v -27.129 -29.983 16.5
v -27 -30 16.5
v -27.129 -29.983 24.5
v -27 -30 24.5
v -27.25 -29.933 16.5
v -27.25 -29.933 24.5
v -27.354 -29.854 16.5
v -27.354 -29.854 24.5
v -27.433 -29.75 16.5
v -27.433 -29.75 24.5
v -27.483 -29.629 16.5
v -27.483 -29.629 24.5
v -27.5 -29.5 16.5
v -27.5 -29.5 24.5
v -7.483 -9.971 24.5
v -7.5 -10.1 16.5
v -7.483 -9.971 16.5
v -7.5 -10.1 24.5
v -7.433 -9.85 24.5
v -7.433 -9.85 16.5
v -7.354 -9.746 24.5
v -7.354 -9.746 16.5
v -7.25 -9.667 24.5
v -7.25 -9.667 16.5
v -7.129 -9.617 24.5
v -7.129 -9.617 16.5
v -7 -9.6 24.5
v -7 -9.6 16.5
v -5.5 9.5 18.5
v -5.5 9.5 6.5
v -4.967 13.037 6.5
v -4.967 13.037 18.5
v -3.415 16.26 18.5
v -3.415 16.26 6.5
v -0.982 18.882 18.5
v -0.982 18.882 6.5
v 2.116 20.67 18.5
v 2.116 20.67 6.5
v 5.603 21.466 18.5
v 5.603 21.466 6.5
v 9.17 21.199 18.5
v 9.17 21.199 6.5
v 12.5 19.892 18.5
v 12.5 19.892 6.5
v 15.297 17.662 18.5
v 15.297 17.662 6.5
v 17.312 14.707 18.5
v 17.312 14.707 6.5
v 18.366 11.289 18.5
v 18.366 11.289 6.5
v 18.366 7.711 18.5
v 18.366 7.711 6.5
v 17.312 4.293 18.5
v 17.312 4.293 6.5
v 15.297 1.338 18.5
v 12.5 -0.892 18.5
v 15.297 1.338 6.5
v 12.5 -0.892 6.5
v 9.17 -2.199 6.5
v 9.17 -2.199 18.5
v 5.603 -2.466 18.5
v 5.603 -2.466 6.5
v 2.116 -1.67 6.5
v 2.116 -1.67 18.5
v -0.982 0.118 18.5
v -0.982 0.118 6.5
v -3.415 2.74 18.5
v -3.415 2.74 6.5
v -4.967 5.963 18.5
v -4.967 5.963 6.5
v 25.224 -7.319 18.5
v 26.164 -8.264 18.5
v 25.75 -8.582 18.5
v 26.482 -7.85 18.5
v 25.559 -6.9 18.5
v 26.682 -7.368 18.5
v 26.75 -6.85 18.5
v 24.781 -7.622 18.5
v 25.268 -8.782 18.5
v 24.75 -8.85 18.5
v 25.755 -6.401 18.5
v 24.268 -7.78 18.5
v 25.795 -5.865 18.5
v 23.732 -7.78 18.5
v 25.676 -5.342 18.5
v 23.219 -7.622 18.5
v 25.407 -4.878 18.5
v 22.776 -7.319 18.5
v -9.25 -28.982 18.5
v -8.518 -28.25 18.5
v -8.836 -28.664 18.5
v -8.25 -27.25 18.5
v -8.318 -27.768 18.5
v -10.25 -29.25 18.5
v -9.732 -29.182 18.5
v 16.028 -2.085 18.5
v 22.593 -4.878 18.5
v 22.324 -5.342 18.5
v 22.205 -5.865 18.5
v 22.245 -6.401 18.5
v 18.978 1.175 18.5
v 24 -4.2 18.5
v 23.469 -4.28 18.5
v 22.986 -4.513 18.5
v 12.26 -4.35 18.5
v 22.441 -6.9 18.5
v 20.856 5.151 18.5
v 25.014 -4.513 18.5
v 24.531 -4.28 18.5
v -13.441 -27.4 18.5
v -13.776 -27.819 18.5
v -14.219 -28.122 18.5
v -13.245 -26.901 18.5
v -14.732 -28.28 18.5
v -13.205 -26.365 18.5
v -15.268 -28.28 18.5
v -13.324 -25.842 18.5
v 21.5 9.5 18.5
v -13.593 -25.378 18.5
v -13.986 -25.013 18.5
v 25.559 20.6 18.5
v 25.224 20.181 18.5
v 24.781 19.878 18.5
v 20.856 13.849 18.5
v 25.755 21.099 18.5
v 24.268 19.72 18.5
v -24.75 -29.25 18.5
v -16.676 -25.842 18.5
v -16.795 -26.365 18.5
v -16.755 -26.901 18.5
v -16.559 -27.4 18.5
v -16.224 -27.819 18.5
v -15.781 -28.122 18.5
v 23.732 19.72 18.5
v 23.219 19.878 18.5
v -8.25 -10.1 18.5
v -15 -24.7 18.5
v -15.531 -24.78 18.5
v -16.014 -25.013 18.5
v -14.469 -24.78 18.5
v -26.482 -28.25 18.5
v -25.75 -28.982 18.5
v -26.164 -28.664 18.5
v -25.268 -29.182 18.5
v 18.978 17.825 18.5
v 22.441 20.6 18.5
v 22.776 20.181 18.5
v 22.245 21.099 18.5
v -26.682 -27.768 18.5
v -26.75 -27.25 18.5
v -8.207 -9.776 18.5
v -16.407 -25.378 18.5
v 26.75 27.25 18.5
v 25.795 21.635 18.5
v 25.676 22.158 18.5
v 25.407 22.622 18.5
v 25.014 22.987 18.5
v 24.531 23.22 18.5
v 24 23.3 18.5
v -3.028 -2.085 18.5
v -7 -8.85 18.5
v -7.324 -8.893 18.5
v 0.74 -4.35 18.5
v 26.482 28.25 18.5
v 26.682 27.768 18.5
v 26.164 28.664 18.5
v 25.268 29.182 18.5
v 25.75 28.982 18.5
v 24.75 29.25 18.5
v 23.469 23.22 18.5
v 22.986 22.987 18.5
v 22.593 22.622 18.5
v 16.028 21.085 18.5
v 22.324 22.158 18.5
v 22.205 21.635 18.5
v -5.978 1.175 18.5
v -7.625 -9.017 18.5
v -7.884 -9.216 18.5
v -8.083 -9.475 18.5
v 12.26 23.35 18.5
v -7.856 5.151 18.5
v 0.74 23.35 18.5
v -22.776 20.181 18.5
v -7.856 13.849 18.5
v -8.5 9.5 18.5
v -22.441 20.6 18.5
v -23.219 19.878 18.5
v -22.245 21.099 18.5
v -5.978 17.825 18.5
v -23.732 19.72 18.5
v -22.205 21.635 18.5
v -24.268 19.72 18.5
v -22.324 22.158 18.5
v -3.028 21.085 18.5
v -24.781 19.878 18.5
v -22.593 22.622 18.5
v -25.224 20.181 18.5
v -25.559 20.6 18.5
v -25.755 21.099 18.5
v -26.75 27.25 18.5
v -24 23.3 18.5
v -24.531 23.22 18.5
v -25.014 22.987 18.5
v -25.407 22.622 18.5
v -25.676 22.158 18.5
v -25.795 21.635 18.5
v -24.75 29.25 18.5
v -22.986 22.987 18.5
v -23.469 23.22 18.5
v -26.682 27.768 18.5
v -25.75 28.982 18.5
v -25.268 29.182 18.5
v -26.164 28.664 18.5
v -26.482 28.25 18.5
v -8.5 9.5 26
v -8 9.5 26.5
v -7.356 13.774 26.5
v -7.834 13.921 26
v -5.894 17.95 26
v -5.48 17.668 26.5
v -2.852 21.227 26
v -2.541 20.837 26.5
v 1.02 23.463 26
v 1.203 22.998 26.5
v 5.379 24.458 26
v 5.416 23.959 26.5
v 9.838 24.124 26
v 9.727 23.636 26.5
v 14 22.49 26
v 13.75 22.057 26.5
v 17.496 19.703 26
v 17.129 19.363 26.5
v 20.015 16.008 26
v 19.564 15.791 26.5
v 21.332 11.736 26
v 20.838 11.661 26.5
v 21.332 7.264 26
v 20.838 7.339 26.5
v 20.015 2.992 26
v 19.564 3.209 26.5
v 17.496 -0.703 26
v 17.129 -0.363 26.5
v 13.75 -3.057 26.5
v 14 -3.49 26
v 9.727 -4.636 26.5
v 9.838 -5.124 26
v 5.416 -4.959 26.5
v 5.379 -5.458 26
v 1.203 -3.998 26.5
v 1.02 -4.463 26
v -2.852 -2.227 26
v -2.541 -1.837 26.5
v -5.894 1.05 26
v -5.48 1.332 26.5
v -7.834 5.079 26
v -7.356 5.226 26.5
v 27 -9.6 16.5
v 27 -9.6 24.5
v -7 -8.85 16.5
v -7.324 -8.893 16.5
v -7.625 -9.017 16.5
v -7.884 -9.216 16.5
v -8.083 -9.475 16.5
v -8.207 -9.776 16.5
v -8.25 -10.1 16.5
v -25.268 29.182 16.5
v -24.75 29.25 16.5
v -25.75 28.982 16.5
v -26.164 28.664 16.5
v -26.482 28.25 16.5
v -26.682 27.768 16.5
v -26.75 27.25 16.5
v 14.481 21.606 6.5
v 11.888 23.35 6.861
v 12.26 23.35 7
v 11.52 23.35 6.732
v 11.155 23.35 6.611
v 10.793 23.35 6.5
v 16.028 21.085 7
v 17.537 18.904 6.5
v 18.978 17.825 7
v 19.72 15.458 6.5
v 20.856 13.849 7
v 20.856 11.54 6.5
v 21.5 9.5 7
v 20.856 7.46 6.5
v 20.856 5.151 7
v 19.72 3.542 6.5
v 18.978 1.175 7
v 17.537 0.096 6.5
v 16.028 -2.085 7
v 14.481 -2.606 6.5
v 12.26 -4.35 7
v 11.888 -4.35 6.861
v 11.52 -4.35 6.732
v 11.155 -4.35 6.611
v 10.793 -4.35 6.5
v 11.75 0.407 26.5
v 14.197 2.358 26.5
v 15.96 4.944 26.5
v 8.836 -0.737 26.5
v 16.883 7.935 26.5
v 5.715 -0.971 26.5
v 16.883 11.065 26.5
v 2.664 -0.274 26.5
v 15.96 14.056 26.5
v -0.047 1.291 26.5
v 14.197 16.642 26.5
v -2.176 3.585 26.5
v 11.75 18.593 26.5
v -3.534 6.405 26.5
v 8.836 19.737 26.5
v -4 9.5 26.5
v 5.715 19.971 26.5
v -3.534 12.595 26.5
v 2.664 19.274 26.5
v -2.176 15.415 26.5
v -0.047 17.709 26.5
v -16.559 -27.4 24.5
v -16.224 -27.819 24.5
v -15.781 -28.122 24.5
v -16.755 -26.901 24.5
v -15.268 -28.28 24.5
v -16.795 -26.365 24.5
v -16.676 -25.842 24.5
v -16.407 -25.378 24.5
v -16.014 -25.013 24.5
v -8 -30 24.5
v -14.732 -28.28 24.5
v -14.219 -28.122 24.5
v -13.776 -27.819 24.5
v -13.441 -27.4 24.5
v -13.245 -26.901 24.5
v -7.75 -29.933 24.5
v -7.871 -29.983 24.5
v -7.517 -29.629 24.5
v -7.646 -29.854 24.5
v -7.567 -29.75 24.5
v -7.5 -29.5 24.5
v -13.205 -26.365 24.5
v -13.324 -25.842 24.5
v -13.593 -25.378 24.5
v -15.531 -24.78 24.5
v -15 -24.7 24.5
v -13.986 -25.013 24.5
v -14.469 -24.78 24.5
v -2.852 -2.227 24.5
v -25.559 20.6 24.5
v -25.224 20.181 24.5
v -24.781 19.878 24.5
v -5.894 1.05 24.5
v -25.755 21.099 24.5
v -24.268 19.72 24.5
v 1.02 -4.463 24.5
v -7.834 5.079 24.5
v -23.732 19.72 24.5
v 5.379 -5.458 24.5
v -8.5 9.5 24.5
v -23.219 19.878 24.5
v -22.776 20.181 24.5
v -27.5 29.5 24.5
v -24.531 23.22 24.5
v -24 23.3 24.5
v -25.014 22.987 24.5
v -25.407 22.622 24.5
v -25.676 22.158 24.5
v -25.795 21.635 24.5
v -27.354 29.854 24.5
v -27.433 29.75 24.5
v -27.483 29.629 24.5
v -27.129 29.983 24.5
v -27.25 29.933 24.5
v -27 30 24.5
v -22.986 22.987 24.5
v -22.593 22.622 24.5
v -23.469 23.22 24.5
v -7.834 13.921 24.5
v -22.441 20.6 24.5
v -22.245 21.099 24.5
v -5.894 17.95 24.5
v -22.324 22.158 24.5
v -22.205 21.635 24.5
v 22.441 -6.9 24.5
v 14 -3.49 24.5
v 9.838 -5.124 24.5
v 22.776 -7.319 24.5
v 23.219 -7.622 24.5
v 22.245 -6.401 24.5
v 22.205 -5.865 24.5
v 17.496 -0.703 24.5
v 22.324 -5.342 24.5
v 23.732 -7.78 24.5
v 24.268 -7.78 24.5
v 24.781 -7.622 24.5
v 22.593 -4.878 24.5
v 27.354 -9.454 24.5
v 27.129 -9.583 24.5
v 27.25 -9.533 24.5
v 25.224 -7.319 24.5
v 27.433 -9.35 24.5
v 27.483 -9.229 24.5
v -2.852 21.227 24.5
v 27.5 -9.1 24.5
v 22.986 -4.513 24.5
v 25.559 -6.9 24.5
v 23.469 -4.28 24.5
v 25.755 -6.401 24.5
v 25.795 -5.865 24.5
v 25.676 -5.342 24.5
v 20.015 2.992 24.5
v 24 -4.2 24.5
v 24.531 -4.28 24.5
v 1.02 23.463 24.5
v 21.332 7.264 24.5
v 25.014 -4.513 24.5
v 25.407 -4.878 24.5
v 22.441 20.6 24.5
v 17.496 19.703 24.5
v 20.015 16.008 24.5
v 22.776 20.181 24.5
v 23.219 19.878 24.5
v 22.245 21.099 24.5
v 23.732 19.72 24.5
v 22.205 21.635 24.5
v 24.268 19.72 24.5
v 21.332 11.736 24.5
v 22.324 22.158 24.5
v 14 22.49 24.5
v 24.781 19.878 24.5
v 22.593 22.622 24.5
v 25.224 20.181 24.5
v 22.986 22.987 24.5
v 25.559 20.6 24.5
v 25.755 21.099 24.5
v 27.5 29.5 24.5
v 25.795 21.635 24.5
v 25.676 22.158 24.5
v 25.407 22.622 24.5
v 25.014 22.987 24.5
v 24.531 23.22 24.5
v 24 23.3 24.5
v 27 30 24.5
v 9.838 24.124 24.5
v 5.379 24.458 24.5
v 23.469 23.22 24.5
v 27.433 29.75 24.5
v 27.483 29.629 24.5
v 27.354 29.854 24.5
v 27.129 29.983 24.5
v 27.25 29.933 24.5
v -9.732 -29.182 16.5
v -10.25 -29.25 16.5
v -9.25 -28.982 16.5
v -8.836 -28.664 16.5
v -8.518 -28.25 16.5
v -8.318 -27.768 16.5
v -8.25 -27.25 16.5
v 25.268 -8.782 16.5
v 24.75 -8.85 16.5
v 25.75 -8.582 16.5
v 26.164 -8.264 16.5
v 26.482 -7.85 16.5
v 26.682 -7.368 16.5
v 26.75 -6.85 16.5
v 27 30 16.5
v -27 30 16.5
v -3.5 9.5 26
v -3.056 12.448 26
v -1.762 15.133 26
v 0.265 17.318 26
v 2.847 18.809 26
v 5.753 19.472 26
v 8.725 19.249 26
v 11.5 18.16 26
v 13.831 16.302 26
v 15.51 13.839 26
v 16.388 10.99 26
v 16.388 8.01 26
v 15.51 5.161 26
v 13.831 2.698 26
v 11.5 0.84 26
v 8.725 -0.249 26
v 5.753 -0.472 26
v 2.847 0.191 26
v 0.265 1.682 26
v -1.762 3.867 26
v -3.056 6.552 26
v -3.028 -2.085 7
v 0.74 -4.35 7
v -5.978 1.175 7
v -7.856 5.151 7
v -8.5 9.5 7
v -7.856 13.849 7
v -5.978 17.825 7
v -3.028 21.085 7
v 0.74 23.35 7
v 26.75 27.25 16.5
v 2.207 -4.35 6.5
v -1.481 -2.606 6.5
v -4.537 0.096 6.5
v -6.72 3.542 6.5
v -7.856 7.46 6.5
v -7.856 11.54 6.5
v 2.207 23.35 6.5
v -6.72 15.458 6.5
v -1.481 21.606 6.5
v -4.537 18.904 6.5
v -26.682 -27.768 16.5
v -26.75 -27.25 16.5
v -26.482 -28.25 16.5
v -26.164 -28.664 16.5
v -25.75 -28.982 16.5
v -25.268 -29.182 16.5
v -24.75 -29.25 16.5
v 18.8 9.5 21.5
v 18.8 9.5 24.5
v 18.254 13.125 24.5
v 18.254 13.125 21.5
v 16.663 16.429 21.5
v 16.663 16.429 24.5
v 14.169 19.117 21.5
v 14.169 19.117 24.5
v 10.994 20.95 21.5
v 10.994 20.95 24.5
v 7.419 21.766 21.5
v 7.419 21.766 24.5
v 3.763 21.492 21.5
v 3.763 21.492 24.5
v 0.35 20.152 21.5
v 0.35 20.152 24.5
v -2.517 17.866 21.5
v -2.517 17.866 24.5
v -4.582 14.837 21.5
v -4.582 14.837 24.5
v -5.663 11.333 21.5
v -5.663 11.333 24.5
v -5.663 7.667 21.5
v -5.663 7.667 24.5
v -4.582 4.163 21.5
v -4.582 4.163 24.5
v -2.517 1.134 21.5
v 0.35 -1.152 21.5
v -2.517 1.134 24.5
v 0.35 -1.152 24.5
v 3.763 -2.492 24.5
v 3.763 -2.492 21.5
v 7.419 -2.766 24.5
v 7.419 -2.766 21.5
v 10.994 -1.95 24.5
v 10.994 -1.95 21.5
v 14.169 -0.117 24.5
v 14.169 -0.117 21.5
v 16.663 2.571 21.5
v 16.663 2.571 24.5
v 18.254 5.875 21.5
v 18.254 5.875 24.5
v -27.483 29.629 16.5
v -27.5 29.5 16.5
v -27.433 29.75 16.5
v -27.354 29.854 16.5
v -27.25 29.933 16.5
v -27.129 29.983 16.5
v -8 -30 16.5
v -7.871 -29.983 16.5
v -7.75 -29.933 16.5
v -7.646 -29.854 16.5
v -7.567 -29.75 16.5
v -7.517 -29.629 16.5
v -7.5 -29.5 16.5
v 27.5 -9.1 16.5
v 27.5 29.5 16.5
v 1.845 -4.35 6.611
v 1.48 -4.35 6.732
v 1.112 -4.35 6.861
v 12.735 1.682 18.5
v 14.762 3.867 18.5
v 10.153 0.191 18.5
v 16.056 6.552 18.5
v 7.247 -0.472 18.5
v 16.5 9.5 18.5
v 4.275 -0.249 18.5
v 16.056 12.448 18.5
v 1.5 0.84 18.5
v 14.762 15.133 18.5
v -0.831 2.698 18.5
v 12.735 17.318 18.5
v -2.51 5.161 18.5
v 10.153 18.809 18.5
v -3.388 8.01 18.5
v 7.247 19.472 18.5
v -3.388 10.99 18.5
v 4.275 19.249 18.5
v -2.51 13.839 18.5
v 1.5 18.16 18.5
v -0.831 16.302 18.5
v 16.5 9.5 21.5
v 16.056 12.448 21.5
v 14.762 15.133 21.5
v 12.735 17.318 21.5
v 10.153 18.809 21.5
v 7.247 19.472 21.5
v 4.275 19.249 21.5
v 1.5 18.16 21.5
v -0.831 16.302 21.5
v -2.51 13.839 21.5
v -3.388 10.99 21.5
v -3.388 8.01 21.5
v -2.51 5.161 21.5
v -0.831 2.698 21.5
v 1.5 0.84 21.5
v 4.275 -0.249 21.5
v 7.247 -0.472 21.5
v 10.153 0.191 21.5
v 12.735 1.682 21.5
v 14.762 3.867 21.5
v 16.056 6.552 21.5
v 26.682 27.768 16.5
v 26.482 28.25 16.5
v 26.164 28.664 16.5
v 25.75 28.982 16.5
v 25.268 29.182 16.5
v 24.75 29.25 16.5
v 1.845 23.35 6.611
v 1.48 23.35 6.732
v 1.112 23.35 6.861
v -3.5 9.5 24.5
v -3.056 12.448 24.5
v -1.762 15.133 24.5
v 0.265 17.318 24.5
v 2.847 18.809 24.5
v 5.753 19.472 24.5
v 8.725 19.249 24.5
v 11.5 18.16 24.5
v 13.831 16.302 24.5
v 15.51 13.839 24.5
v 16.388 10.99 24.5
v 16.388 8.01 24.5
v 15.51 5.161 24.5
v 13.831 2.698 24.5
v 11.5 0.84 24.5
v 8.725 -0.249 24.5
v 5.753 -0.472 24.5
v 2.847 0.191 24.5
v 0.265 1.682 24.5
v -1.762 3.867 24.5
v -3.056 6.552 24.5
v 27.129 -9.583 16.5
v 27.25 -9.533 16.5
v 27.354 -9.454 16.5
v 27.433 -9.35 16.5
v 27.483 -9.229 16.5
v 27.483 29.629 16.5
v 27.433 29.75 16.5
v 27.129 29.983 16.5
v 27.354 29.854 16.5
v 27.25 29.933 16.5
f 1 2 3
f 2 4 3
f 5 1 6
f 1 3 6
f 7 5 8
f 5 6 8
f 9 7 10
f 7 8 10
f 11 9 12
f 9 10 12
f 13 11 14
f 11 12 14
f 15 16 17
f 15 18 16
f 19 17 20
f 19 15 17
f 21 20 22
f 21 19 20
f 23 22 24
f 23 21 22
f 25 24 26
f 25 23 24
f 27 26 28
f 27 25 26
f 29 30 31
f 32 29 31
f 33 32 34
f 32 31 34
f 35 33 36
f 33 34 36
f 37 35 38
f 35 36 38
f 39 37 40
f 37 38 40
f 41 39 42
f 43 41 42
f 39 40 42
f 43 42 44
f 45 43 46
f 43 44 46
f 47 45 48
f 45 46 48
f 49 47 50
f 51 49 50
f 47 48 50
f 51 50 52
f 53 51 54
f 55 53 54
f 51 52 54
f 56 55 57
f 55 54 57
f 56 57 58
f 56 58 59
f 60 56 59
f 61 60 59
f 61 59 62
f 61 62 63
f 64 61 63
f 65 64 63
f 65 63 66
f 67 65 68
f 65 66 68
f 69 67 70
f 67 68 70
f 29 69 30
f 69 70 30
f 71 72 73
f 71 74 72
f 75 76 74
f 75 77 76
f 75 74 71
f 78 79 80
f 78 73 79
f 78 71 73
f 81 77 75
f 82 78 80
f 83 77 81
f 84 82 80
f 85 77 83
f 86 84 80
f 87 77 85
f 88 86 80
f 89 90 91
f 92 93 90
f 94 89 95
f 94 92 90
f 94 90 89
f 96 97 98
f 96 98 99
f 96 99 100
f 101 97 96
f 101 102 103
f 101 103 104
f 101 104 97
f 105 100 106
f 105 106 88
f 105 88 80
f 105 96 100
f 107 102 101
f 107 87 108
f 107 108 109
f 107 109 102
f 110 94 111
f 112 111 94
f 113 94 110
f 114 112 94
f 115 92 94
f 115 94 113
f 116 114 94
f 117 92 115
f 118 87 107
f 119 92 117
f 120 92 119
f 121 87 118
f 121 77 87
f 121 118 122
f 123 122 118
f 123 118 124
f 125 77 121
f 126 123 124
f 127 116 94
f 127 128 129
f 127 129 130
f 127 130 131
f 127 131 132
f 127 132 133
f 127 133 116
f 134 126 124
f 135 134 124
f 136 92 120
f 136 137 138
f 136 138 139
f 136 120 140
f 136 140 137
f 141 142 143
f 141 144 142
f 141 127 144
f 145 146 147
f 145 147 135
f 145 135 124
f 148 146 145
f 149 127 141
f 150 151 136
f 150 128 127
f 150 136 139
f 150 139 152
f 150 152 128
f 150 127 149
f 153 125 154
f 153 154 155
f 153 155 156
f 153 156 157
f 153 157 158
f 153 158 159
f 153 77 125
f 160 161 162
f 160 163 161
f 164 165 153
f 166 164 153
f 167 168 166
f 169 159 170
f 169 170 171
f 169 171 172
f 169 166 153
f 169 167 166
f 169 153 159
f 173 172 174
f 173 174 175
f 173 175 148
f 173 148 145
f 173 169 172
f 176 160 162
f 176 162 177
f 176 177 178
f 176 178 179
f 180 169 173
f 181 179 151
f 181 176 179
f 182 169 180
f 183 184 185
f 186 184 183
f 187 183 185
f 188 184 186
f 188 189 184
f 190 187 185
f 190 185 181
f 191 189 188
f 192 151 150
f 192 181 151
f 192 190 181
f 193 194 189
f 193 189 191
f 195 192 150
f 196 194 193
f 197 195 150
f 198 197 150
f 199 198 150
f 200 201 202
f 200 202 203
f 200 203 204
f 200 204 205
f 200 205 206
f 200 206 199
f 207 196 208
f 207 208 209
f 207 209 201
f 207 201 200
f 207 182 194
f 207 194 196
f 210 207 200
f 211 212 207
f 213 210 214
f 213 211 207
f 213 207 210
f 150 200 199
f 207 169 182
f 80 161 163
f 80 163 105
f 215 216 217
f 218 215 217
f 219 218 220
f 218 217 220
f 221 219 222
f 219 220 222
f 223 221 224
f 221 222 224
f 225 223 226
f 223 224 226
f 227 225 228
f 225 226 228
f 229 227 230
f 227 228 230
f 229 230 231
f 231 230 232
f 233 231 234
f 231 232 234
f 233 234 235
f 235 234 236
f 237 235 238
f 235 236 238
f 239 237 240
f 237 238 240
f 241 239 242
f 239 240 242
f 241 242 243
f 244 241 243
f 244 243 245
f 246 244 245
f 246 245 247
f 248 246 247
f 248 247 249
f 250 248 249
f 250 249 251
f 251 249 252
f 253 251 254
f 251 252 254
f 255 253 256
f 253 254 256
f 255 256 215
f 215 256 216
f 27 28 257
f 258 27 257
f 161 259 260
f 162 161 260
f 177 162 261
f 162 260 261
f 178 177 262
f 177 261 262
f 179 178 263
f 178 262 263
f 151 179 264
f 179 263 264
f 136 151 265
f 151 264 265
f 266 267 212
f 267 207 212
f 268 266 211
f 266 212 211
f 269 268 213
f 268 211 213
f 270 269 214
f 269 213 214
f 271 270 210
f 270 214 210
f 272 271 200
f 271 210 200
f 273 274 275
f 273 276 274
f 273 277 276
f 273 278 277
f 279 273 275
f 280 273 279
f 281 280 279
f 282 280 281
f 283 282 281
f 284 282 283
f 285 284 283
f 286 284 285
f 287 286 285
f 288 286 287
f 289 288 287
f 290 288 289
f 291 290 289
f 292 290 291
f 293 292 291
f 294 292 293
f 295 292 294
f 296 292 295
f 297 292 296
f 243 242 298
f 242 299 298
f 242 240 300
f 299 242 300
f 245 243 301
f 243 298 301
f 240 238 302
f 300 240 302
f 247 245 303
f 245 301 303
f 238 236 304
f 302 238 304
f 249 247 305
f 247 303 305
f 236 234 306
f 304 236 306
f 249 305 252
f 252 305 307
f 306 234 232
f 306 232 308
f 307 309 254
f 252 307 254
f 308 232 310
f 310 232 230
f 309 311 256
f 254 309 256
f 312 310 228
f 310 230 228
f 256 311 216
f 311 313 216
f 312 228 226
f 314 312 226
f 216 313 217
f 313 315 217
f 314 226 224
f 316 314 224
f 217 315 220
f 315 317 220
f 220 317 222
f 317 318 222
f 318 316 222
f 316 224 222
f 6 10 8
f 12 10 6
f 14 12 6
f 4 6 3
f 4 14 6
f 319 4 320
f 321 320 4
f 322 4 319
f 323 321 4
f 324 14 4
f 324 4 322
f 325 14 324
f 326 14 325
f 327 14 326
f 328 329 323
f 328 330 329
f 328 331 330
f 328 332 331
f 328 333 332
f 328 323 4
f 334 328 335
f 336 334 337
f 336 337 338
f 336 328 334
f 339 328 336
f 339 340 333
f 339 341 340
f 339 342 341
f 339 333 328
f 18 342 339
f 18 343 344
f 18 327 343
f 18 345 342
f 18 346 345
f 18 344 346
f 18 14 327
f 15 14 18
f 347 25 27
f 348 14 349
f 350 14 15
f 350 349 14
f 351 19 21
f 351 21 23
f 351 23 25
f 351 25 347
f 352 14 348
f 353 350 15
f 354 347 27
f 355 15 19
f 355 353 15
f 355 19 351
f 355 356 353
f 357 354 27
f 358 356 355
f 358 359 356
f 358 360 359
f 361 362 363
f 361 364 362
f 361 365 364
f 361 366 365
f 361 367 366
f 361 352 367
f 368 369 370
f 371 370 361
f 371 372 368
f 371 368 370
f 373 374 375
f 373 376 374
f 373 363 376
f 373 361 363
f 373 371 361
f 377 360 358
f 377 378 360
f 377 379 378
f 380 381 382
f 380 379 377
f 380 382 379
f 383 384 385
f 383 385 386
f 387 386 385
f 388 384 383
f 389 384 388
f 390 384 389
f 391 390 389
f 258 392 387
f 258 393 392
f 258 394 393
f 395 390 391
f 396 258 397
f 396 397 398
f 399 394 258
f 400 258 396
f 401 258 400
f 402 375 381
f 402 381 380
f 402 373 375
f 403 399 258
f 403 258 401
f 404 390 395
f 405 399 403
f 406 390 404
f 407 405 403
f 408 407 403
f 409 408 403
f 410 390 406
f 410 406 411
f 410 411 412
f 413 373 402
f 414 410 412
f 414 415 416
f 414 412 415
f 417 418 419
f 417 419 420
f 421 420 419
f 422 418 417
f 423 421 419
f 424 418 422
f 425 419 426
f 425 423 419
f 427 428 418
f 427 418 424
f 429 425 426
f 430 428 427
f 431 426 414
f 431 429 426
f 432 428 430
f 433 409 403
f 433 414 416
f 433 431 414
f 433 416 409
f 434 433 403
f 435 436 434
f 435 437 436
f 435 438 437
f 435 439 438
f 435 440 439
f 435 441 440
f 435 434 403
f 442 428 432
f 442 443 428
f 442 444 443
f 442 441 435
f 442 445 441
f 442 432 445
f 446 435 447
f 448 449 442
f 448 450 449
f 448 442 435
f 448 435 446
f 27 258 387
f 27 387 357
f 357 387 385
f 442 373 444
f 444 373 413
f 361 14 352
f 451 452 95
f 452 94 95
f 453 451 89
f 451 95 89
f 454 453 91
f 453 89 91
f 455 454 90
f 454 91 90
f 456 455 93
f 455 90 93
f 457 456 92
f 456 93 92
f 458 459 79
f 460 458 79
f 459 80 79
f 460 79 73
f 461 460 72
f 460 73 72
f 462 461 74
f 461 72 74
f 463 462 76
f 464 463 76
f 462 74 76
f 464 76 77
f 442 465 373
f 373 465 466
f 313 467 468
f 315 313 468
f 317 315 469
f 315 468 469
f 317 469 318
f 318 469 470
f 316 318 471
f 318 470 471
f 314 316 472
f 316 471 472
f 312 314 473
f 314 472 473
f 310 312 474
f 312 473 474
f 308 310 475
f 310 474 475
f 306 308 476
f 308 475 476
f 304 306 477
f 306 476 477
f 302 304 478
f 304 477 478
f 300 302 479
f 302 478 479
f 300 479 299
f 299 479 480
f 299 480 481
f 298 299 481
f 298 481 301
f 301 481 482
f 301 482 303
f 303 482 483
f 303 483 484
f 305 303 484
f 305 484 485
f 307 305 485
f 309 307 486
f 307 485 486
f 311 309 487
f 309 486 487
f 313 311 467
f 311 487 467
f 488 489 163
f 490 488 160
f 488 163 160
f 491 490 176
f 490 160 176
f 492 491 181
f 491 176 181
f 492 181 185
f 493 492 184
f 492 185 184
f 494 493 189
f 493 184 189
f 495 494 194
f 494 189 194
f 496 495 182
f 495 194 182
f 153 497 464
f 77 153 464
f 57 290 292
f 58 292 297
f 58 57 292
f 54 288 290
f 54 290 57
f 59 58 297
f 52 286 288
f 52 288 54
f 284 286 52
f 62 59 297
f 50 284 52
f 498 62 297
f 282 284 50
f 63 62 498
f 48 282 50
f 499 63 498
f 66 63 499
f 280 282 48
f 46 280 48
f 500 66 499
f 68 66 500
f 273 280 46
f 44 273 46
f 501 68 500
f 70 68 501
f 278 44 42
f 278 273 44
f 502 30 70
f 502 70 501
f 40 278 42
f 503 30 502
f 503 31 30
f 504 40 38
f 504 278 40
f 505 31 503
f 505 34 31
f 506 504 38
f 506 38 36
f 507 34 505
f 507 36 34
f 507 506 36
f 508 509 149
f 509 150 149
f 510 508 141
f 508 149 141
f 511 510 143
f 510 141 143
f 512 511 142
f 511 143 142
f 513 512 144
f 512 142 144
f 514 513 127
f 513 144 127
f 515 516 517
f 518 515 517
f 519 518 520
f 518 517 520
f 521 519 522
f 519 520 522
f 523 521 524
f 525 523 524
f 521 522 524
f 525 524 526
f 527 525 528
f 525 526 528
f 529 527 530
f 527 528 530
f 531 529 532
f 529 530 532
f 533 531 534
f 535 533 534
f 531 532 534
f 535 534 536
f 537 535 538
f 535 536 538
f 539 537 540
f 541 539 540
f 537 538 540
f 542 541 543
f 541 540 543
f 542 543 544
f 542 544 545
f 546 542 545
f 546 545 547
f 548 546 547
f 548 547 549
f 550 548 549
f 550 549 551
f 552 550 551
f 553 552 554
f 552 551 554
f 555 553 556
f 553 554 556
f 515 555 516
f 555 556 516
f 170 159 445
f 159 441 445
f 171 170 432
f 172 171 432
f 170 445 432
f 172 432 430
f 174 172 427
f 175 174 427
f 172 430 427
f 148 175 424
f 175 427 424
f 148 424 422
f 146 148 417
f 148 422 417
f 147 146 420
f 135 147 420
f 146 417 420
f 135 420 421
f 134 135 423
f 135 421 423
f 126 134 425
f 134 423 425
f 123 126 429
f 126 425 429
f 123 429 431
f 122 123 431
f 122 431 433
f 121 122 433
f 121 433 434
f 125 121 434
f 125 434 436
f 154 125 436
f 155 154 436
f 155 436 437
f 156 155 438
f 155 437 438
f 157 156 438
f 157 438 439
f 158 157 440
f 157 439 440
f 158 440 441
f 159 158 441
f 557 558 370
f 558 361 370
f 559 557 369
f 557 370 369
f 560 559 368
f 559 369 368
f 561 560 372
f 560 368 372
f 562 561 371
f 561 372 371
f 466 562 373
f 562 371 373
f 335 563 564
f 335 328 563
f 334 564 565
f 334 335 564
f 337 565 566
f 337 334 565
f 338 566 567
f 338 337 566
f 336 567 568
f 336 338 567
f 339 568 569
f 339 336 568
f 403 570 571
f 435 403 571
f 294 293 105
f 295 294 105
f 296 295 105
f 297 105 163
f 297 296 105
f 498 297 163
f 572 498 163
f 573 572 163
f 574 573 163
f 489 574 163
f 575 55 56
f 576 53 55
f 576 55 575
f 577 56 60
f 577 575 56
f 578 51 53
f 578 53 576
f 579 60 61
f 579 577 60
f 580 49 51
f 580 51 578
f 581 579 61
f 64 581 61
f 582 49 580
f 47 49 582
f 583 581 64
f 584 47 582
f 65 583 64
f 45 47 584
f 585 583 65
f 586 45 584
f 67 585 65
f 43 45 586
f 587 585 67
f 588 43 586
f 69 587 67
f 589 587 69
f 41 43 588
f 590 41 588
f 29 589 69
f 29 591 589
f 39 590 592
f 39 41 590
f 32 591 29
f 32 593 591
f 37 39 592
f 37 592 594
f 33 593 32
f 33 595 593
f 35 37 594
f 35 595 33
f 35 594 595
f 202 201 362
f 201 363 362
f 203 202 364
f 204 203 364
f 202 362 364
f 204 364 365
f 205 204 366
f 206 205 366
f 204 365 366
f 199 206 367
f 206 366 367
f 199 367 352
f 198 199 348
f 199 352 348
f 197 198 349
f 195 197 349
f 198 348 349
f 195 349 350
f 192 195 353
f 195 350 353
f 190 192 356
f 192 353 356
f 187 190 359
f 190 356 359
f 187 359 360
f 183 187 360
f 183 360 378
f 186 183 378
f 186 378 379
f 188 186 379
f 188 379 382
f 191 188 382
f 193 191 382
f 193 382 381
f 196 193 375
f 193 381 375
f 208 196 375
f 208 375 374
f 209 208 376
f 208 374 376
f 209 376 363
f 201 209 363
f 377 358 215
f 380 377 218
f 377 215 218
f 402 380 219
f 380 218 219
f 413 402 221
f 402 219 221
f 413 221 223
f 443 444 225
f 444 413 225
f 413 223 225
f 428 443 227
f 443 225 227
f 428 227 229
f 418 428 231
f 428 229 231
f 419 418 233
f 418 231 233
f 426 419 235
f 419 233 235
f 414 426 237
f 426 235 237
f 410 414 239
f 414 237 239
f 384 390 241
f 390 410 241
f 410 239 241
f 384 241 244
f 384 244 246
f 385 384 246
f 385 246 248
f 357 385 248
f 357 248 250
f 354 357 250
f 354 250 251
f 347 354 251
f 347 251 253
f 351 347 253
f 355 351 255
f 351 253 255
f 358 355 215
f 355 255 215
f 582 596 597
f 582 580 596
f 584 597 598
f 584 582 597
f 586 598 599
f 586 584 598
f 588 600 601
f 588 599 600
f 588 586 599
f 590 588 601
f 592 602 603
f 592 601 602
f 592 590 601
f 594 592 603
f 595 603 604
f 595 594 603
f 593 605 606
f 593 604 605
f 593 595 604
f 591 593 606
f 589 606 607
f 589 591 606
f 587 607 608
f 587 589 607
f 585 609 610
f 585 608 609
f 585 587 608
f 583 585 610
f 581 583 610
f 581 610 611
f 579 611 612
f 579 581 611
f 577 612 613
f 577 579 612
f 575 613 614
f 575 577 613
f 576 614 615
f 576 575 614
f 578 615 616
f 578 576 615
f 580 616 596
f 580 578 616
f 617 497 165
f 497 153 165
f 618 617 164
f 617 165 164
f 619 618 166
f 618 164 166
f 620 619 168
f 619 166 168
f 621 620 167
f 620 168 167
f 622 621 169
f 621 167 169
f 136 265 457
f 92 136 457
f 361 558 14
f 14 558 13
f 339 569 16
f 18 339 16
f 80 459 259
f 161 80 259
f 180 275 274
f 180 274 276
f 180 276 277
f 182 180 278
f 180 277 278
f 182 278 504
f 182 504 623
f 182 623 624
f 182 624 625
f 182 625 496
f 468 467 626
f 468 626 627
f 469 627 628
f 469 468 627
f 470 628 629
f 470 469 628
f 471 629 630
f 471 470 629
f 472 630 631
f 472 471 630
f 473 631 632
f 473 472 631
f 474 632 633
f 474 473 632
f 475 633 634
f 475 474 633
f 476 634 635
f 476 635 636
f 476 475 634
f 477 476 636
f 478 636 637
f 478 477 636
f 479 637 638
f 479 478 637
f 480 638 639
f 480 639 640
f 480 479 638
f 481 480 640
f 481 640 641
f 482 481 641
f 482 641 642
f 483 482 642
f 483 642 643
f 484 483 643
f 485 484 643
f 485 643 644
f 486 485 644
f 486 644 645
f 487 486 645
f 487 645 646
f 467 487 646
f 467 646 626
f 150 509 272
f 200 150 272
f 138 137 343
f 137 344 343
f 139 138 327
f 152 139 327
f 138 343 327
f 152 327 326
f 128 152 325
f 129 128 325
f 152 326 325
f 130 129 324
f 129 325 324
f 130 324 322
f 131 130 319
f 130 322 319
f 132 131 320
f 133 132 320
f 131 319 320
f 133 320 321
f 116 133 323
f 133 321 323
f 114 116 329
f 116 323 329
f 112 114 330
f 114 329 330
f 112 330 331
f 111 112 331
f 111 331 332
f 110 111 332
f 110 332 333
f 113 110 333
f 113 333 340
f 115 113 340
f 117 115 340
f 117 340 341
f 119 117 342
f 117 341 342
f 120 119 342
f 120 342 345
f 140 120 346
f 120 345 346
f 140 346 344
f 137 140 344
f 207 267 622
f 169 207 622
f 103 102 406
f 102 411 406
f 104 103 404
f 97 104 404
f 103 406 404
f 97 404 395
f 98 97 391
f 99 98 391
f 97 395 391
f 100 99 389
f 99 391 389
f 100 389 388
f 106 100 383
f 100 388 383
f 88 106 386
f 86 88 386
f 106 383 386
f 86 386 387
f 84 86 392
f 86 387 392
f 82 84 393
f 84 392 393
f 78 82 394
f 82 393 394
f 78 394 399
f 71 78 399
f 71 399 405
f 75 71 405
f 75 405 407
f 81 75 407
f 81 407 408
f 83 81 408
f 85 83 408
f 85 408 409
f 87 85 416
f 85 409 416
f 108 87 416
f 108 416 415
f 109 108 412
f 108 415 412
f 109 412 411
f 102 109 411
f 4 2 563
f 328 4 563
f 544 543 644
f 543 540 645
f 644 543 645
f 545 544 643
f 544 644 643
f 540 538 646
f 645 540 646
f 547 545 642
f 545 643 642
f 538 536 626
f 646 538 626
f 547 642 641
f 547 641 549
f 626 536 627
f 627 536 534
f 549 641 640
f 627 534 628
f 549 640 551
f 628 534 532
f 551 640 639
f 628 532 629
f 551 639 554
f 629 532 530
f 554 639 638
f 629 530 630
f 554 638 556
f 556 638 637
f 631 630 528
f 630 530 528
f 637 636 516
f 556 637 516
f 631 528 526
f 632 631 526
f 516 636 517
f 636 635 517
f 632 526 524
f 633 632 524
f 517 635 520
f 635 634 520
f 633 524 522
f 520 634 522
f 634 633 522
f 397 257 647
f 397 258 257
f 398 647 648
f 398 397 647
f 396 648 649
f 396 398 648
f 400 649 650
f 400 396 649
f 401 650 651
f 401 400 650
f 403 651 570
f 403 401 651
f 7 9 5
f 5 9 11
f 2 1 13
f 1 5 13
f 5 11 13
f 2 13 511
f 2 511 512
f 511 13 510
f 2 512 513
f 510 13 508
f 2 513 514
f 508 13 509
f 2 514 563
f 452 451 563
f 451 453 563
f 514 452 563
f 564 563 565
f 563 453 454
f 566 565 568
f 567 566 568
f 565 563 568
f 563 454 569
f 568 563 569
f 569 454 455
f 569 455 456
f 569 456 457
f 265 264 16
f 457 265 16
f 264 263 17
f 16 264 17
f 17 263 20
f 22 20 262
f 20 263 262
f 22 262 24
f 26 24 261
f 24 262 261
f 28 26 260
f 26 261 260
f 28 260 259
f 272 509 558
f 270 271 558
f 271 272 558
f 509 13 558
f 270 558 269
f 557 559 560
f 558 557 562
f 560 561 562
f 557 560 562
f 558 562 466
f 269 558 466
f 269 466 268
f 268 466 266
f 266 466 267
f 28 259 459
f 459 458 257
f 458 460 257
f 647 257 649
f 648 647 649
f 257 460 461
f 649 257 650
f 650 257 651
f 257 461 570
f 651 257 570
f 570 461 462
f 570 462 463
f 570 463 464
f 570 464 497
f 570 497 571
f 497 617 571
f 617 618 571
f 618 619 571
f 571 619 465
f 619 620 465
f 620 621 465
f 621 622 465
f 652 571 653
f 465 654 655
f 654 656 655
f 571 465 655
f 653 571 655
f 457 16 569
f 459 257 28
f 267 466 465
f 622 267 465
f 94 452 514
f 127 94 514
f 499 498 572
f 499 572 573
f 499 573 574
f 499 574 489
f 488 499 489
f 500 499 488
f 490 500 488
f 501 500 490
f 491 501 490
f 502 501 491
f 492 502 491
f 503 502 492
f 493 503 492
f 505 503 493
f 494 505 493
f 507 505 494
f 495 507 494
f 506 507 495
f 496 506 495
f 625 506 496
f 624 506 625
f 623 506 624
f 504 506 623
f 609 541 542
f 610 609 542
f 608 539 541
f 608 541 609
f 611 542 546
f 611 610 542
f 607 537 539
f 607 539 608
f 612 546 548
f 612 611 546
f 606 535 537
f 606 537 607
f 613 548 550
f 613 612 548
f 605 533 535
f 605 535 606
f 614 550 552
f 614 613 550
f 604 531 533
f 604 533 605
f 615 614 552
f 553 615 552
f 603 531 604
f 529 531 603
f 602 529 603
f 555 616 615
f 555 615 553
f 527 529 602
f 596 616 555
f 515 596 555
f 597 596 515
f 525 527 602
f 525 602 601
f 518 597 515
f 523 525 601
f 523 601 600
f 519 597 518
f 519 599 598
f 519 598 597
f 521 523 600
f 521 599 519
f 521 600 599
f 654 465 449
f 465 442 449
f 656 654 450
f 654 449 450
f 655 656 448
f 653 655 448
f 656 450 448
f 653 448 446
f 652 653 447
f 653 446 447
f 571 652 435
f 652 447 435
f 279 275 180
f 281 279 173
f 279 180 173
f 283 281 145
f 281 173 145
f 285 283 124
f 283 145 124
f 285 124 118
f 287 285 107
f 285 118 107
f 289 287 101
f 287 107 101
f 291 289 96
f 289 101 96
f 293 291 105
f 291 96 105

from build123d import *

# Parameters (mm, degrees)
SKETCH_1_W                       = 55
SKETCH_1_H                       = 60
EXTRUDE_1_DEPTH                  = 16.5
HOLE_WIZARD_3_6_3_6_1_D          = 3.6
HOLE_WIZARD_3_6_3_6_1_DEPTH      = 25
HOLE_WIZARD_3_6_3_6_1_TIP        = 1.081549114
HOLE_WIZARD_M2_5_1_D             = 2.05
HOLE_WIZARD_M2_5_1_DEPTH         = 14
HOLE_WIZARD_M2_5_1_TIP           = 0.615882135
SKETCH_8_W                       = 35
SKETCH_8_H                       = 20.4
CUT_EXTRUDE_1_DEPTH              = 44.914690025
CUT_EXTRUDE_START                = 2.5
SKETCH_9_W                       = 20
SKETCH_9_H                       = 6
CUT_EXTRUDE_2_DEPTH              = 42.414690025
SHELL_START                      = 1.8
SHELL_1_DEPTH                    = 14.7
EXTRUDE_2_DEPTH                  = 8
SKETCH_16_R                      = 3
CUT_EXTRUDE_4_DEPTH              = 12
CUT_EXTRUDE_5_DEPTH              = 47.599785407
CUT_EXTRUDE_5_DEPTH_BACK         = 47.599785407
SKETCH_17_R                      = 10
FILLET_1_R                       = 0.5
FILLET_2_R                       = 0.5
SKETCH_20_W                      = 1.8
SKETCH_20_H                      = 8
HOLE_WIZARD_3_6_3_6_2_AT_2_COUNT = 2
HOLE_WIZARD_3_6_3_6_2_AT_2_PITCH = 27.5
HOLE_WIZARD_3_6_3_6_2_AT_3_COUNT = 2
HOLE_WIZARD_3_6_3_6_2_AT_3_PITCH = 61.846584384
HOLE_WIZARD_3_6_3_6_2_AT_4_COUNT = 2
HOLE_WIZARD_3_6_3_6_2_AT_4_PITCH = 48
CUT_EXTRUDE_6_DEPTH              = 2
FILLET_3_R                       = 2
EXTRUDE_START                    = -8
SKETCH_24_R                      = 15
SKETCH_24_R_2                    = 10
EXTRUDE_3_DEPTH                  = 20
CHAMFER_1_SIZE                   = 0.5
CUT_EXTRUDE_START_2              = -2
SKETCH_25_R                      = 12.3
CUT_EXTRUDE_7_DEPTH              = 3
SKETCH_26_R                      = 12
CUT_EXTRUDE_8_DEPTH              = 12
SKETCH_27_W                      = 27.90091823
SKETCH_27_H                      = 2.950248151
CUT_EXTRUDE_9_DEPTH              = 12


# Read off the part's stored shape, not the designer's step: 抽壳1
with BuildPart() as part:
    # 草图1 → 凸台-拉伸1 (new body)
    with BuildSketch(Plane.XY):
        Rectangle(SKETCH_1_W, SKETCH_1_H)
    extrude(amount=EXTRUDE_1_DEPTH)

    # Ø3.6 (3.6) 直径孔1
    with Locations(Plane.XY.offset(16.5)):
        with Locations((-24, 21.5), (24, 21.5), (24, -6), (-15, -26.5)):
            Hole(HOLE_WIZARD_3_6_3_6_1_D / 2, depth=HOLE_WIZARD_3_6_3_6_1_DEPTH)
            with Locations((0, 0, -(HOLE_WIZARD_3_6_3_6_1_DEPTH + HOLE_WIZARD_3_6_3_6_1_TIP / 2))):  # 118° drill point
                Cone(0, HOLE_WIZARD_3_6_3_6_1_D / 2, HOLE_WIZARD_3_6_3_6_1_TIP, mode=Mode.SUBTRACT)

    # M2.5 螺纹孔1
    with Locations(Plane.XY.offset(16.5)):
        with Locations((-24, 26.5), (24, 26.5), (24, -1), (-22.5, -26.5)):
            Hole(HOLE_WIZARD_M2_5_1_D / 2, depth=HOLE_WIZARD_M2_5_1_DEPTH)
            with Locations((0, 0, -(HOLE_WIZARD_M2_5_1_DEPTH + HOLE_WIZARD_M2_5_1_TIP / 2))):  # 118° drill point
                Cone(0, HOLE_WIZARD_M2_5_1_D / 2, HOLE_WIZARD_M2_5_1_TIP, mode=Mode.SUBTRACT)

    # 草图8 → 切除-拉伸1 (cut, through all)
    with BuildSketch(Plane.XY.offset(16.5)):
        with Locations((10, -19.8)):
            Rectangle(SKETCH_8_W, SKETCH_8_H)
    extrude(amount=-CUT_EXTRUDE_1_DEPTH, mode=Mode.SUBTRACT)

    # 草图9 → 切除-拉伸2 (cut, through all)
    with BuildSketch(Plane(origin=(0, 0, 16.5), x_dir=(-1, 0, 0), z_dir=(0, 0, -1)).offset(CUT_EXTRUDE_START)):
        with Locations((17.5, -27)):
            Rectangle(SKETCH_9_W, SKETCH_9_H)
    extrude(amount=CUT_EXTRUDE_2_DEPTH, mode=Mode.SUBTRACT)

    # 抽壳1 outline → 抽壳1 (cut)
    with BuildSketch(Plane.XY.offset(SHELL_START)):
        with BuildLine():
            ThreePointArc((-21.743758657, 28.2), (-21.182110509, 26.299690696), (-22.006919283, 24.4979375))
            ThreePointArc((-22.006919283, 24.4979375), (-20.910890356, 19.651378458), (-25.7, 18.326673669))
            Line((-25.7, 18.326673669), (-25.7, -22.2))
            Line((-25.7, -22.2), (-9.3, -22.2))
            Line((-9.3, -22.2), (-9.3, -7.8))
            Line((-9.3, -7.8), (20.882308546, -7.8))
            ThreePointArc((20.882308546, -7.8), (20.494996561, -5.178446051), (22.006919283, -3.0020625))
            ThreePointArc((22.006919283, -3.0020625), (21.865811165, 0.8509087), (25.7, 1.256241343))
            Line((25.7, 1.256241343), (25.7, 18.326673669))
            ThreePointArc((25.7, 18.326673669), (20.910890356, 19.651378458), (22.006919283, 24.4979375))
            ThreePointArc((22.006919283, 24.4979375), (21.182110509, 26.299690696), (21.743758657, 28.2))
            Line((21.743758657, 28.2), (-21.743758657, 28.2))
        make_face()
    extrude(amount=SHELL_1_DEPTH, mode=Mode.SUBTRACT)

    # 草图16 → 切除-拉伸4 (cut)
    with BuildSketch(Plane(origin=(-7.5, 0, 0), x_dir=(0, 0, -1), z_dir=(1, 0, 0))):
        with Locations(Location((-8, -18, 0), (0, 0, 90))):
            Circle(SKETCH_16_R)
    extrude(amount=-CUT_EXTRUDE_4_DEPTH, mode=Mode.SUBTRACT)


with BuildPart() as body_2:
    # 草图10 → 凸台-拉伸2 (new body)
    with BuildSketch(Plane.XY.offset(16.5)):
        Polygon((-27.5, -30), (-7.5, -30), (-7.5, -9.6), (27.5, -9.6), (27.5, 30), (-27.5, 30), align=None)
    extrude(amount=EXTRUDE_2_DEPTH)


with BuildPart() as cut_extrude_5_tool:
    # 草图17 → 切除-拉伸5 (new, two sides: drawn at the far end of the back side and taken through both)
    with BuildSketch(Plane.XY.offset(1.8).offset(-CUT_EXTRUDE_5_DEPTH_BACK)):
        with Locations((6.5, 9.5)):
            Circle(SKETCH_17_R)
    extrude(amount=CUT_EXTRUDE_5_DEPTH + CUT_EXTRUDE_5_DEPTH_BACK)


with BuildPart() as part_1:
    add(part.part)

    # 切除-拉伸5: cut by cut_extrude_5_tool
    add(cut_extrude_5_tool.part, mode=Mode.SUBTRACT)

    # 圆角1
    fillet_1_edges = [part_1.edges().sort_by_distance(p)[0] for p in [
        (-27.5, 3, 0),
        (0, 30, 0),
        (27.5, 10.2, 0),
        (27.5, -9.6, 8.25),
        (-7.5, -16.8, 0),
        (10, -9.6, 0),
        (-7.5, -9.6, 8.25),
        (-7.5, -30, 15.25),
        (-27.5, -30, 15.25),
        (-27.5, 30, 8.25),
        (27.5, 30, 8.25),
        (-17.5, -24, 0),
        (-7.5, -24, 7),
        (-27.5, -24, 7),
    ]]
    fillet(fillet_1_edges, radius=FILLET_1_R)


with BuildPart() as body_2_1:
    add(body_2.part)

    # 切除-拉伸5: cut by cut_extrude_5_tool
    add(cut_extrude_5_tool.part, mode=Mode.SUBTRACT)

    # 圆角2
    fillet_2_edges = [body_2_1.edges().sort_by_distance(p)[0] for p in [
        (-27.5, 30, 20.5),
        (27.5, 30, 20.5),
        (27.5, -9.6, 20.5),
        (-7.5, -9.6, 20.5),
        (-7.5, -30, 20.5),
        (-27.5, -30, 20.5),
    ]]
    fillet(fillet_2_edges, radius=FILLET_2_R)

    # 草图20 → Ø3.6 (3.6) 直径孔2 (revolve, cut)
    with BuildSketch(Plane(origin=(24, 21.5, 16.5), x_dir=(0, 1, 0), z_dir=(1, 0, 0))):
        with Locations((0.9, 4)):
            Rectangle(SKETCH_20_W, SKETCH_20_H)
    hole_wizard_3_6_3_6_2 = revolve(axis=Axis((24, 21.5, 10.15), (0, 0, 1)), mode=Mode.SUBTRACT)

    # Ø3.6 (3.6) 直径孔2 at 2: Ø3.6 (3.6) 直径孔2 ×2
    with Locations(*[(0, -i * HOLE_WIZARD_3_6_3_6_2_AT_2_PITCH, 0) for i in range(1, HOLE_WIZARD_3_6_3_6_2_AT_2_COUNT)]):
        add(hole_wizard_3_6_3_6_2, mode=Mode.SUBTRACT)

    # Ø3.6 (3.6) 直径孔2 at 3: Ø3.6 (3.6) 直径孔2 ×2
    with Locations(*[Vector(-0.6305926250944656, -0.7761140001162656, 0) * (i * HOLE_WIZARD_3_6_3_6_2_AT_3_PITCH) for i in range(1, HOLE_WIZARD_3_6_3_6_2_AT_3_COUNT)]):
        add(hole_wizard_3_6_3_6_2, mode=Mode.SUBTRACT)

    # Ø3.6 (3.6) 直径孔2 at 4: Ø3.6 (3.6) 直径孔2 ×2
    with Locations(*[(-i * HOLE_WIZARD_3_6_3_6_2_AT_4_PITCH, 0, 0) for i in range(1, HOLE_WIZARD_3_6_3_6_2_AT_4_COUNT)]):
        add(hole_wizard_3_6_3_6_2, mode=Mode.SUBTRACT)

    # 草图23 → 切除-拉伸6 (cut)
    with BuildSketch(Plane(origin=(0, 0, 16.5), x_dir=(-1, 0, 0), z_dir=(0, 0, -1))):
        with BuildLine():
            Line((8.25, -10.1), (8.25, -29.25))
            Line((8.25, -29.25), (26.75, -29.25))
            Line((26.75, -29.25), (26.75, 29.25))
            Line((26.75, 29.25), (-26.75, 29.25))
            Line((-26.75, 29.25), (-26.75, -8.85))
            Line((-26.75, -8.85), (7, -8.85))
            ThreePointArc((7, -8.85), (7.883883476, -9.216116524), (8.25, -10.1))
        make_face()
    extrude(amount=-CUT_EXTRUDE_6_DEPTH, mode=Mode.SUBTRACT)

    # 圆角3
    fillet_3_edges = [body_2_1.edges().sort_by_distance(p)[0] for p in [
        (26.75, -8.85, 17.5),
        (26.75, 29.25, 17.5),
        (-26.75, 29.25, 17.5),
        (-26.75, -29.25, 17.5),
        (-8.25, -29.25, 17.5),
    ]]
    fillet(fillet_3_edges, radius=FILLET_3_R)

    # 草图24 → 凸台-拉伸3 (add)
    with BuildSketch(Plane(origin=(0, 0, 18.5), x_dir=(-1, 0, 0), z_dir=(0, 0, -1)).offset(EXTRUDE_START)):
        with Locations((-6.5, 9.5)):
            Circle(SKETCH_24_R)
        with Locations((-6.5, 9.5)):
            Circle(SKETCH_24_R_2, mode=Mode.SUBTRACT)
    extrude(amount=EXTRUDE_3_DEPTH)

    # 倒角1
    chamfer_1_edges = [body_2_1.edges().sort_by_distance(p)[0] for p in [
        (21.5, 9.5, 26.5),
        (21.5, 9.5, 6.5),
        (16.5, 9.5, 26.5),
    ]]
    chamfer(chamfer_1_edges, length=CHAMFER_1_SIZE)

    # 草图25 → 切除-拉伸7 (cut)
    with BuildSketch(Plane.XY.offset(26.5).offset(CUT_EXTRUDE_START_2)):
        with Locations((6.5, 9.5)):
            Circle(SKETCH_25_R)
    extrude(amount=-CUT_EXTRUDE_7_DEPTH, mode=Mode.SUBTRACT)

    # 草图26 → 切除-拉伸8 (cut)
    with BuildSketch(Plane(origin=(0, 0, 6.5), x_dir=(-1, 0, 0), z_dir=(0, 0, -1))):
        with Locations((-6.5, 9.5)):
            Circle(SKETCH_26_R)
    extrude(amount=-CUT_EXTRUDE_8_DEPTH, mode=Mode.SUBTRACT)

    # 草图27 → 切除-拉伸9 (cut)
    with BuildSketch(Plane(origin=(0, 0, 6.5), x_dir=(-1, 0, 0), z_dir=(0, 0, -1))):
        with Locations((-4.79900427, -5.825124076)):
            Rectangle(SKETCH_27_W, SKETCH_27_H)
        with Locations((-4.79900427, 24.825124075)):
            Rectangle(SKETCH_27_W, SKETCH_27_H)
    extrude(amount=-CUT_EXTRUDE_9_DEPTH, mode=Mode.SUBTRACT)


solid = body_2_1.part
